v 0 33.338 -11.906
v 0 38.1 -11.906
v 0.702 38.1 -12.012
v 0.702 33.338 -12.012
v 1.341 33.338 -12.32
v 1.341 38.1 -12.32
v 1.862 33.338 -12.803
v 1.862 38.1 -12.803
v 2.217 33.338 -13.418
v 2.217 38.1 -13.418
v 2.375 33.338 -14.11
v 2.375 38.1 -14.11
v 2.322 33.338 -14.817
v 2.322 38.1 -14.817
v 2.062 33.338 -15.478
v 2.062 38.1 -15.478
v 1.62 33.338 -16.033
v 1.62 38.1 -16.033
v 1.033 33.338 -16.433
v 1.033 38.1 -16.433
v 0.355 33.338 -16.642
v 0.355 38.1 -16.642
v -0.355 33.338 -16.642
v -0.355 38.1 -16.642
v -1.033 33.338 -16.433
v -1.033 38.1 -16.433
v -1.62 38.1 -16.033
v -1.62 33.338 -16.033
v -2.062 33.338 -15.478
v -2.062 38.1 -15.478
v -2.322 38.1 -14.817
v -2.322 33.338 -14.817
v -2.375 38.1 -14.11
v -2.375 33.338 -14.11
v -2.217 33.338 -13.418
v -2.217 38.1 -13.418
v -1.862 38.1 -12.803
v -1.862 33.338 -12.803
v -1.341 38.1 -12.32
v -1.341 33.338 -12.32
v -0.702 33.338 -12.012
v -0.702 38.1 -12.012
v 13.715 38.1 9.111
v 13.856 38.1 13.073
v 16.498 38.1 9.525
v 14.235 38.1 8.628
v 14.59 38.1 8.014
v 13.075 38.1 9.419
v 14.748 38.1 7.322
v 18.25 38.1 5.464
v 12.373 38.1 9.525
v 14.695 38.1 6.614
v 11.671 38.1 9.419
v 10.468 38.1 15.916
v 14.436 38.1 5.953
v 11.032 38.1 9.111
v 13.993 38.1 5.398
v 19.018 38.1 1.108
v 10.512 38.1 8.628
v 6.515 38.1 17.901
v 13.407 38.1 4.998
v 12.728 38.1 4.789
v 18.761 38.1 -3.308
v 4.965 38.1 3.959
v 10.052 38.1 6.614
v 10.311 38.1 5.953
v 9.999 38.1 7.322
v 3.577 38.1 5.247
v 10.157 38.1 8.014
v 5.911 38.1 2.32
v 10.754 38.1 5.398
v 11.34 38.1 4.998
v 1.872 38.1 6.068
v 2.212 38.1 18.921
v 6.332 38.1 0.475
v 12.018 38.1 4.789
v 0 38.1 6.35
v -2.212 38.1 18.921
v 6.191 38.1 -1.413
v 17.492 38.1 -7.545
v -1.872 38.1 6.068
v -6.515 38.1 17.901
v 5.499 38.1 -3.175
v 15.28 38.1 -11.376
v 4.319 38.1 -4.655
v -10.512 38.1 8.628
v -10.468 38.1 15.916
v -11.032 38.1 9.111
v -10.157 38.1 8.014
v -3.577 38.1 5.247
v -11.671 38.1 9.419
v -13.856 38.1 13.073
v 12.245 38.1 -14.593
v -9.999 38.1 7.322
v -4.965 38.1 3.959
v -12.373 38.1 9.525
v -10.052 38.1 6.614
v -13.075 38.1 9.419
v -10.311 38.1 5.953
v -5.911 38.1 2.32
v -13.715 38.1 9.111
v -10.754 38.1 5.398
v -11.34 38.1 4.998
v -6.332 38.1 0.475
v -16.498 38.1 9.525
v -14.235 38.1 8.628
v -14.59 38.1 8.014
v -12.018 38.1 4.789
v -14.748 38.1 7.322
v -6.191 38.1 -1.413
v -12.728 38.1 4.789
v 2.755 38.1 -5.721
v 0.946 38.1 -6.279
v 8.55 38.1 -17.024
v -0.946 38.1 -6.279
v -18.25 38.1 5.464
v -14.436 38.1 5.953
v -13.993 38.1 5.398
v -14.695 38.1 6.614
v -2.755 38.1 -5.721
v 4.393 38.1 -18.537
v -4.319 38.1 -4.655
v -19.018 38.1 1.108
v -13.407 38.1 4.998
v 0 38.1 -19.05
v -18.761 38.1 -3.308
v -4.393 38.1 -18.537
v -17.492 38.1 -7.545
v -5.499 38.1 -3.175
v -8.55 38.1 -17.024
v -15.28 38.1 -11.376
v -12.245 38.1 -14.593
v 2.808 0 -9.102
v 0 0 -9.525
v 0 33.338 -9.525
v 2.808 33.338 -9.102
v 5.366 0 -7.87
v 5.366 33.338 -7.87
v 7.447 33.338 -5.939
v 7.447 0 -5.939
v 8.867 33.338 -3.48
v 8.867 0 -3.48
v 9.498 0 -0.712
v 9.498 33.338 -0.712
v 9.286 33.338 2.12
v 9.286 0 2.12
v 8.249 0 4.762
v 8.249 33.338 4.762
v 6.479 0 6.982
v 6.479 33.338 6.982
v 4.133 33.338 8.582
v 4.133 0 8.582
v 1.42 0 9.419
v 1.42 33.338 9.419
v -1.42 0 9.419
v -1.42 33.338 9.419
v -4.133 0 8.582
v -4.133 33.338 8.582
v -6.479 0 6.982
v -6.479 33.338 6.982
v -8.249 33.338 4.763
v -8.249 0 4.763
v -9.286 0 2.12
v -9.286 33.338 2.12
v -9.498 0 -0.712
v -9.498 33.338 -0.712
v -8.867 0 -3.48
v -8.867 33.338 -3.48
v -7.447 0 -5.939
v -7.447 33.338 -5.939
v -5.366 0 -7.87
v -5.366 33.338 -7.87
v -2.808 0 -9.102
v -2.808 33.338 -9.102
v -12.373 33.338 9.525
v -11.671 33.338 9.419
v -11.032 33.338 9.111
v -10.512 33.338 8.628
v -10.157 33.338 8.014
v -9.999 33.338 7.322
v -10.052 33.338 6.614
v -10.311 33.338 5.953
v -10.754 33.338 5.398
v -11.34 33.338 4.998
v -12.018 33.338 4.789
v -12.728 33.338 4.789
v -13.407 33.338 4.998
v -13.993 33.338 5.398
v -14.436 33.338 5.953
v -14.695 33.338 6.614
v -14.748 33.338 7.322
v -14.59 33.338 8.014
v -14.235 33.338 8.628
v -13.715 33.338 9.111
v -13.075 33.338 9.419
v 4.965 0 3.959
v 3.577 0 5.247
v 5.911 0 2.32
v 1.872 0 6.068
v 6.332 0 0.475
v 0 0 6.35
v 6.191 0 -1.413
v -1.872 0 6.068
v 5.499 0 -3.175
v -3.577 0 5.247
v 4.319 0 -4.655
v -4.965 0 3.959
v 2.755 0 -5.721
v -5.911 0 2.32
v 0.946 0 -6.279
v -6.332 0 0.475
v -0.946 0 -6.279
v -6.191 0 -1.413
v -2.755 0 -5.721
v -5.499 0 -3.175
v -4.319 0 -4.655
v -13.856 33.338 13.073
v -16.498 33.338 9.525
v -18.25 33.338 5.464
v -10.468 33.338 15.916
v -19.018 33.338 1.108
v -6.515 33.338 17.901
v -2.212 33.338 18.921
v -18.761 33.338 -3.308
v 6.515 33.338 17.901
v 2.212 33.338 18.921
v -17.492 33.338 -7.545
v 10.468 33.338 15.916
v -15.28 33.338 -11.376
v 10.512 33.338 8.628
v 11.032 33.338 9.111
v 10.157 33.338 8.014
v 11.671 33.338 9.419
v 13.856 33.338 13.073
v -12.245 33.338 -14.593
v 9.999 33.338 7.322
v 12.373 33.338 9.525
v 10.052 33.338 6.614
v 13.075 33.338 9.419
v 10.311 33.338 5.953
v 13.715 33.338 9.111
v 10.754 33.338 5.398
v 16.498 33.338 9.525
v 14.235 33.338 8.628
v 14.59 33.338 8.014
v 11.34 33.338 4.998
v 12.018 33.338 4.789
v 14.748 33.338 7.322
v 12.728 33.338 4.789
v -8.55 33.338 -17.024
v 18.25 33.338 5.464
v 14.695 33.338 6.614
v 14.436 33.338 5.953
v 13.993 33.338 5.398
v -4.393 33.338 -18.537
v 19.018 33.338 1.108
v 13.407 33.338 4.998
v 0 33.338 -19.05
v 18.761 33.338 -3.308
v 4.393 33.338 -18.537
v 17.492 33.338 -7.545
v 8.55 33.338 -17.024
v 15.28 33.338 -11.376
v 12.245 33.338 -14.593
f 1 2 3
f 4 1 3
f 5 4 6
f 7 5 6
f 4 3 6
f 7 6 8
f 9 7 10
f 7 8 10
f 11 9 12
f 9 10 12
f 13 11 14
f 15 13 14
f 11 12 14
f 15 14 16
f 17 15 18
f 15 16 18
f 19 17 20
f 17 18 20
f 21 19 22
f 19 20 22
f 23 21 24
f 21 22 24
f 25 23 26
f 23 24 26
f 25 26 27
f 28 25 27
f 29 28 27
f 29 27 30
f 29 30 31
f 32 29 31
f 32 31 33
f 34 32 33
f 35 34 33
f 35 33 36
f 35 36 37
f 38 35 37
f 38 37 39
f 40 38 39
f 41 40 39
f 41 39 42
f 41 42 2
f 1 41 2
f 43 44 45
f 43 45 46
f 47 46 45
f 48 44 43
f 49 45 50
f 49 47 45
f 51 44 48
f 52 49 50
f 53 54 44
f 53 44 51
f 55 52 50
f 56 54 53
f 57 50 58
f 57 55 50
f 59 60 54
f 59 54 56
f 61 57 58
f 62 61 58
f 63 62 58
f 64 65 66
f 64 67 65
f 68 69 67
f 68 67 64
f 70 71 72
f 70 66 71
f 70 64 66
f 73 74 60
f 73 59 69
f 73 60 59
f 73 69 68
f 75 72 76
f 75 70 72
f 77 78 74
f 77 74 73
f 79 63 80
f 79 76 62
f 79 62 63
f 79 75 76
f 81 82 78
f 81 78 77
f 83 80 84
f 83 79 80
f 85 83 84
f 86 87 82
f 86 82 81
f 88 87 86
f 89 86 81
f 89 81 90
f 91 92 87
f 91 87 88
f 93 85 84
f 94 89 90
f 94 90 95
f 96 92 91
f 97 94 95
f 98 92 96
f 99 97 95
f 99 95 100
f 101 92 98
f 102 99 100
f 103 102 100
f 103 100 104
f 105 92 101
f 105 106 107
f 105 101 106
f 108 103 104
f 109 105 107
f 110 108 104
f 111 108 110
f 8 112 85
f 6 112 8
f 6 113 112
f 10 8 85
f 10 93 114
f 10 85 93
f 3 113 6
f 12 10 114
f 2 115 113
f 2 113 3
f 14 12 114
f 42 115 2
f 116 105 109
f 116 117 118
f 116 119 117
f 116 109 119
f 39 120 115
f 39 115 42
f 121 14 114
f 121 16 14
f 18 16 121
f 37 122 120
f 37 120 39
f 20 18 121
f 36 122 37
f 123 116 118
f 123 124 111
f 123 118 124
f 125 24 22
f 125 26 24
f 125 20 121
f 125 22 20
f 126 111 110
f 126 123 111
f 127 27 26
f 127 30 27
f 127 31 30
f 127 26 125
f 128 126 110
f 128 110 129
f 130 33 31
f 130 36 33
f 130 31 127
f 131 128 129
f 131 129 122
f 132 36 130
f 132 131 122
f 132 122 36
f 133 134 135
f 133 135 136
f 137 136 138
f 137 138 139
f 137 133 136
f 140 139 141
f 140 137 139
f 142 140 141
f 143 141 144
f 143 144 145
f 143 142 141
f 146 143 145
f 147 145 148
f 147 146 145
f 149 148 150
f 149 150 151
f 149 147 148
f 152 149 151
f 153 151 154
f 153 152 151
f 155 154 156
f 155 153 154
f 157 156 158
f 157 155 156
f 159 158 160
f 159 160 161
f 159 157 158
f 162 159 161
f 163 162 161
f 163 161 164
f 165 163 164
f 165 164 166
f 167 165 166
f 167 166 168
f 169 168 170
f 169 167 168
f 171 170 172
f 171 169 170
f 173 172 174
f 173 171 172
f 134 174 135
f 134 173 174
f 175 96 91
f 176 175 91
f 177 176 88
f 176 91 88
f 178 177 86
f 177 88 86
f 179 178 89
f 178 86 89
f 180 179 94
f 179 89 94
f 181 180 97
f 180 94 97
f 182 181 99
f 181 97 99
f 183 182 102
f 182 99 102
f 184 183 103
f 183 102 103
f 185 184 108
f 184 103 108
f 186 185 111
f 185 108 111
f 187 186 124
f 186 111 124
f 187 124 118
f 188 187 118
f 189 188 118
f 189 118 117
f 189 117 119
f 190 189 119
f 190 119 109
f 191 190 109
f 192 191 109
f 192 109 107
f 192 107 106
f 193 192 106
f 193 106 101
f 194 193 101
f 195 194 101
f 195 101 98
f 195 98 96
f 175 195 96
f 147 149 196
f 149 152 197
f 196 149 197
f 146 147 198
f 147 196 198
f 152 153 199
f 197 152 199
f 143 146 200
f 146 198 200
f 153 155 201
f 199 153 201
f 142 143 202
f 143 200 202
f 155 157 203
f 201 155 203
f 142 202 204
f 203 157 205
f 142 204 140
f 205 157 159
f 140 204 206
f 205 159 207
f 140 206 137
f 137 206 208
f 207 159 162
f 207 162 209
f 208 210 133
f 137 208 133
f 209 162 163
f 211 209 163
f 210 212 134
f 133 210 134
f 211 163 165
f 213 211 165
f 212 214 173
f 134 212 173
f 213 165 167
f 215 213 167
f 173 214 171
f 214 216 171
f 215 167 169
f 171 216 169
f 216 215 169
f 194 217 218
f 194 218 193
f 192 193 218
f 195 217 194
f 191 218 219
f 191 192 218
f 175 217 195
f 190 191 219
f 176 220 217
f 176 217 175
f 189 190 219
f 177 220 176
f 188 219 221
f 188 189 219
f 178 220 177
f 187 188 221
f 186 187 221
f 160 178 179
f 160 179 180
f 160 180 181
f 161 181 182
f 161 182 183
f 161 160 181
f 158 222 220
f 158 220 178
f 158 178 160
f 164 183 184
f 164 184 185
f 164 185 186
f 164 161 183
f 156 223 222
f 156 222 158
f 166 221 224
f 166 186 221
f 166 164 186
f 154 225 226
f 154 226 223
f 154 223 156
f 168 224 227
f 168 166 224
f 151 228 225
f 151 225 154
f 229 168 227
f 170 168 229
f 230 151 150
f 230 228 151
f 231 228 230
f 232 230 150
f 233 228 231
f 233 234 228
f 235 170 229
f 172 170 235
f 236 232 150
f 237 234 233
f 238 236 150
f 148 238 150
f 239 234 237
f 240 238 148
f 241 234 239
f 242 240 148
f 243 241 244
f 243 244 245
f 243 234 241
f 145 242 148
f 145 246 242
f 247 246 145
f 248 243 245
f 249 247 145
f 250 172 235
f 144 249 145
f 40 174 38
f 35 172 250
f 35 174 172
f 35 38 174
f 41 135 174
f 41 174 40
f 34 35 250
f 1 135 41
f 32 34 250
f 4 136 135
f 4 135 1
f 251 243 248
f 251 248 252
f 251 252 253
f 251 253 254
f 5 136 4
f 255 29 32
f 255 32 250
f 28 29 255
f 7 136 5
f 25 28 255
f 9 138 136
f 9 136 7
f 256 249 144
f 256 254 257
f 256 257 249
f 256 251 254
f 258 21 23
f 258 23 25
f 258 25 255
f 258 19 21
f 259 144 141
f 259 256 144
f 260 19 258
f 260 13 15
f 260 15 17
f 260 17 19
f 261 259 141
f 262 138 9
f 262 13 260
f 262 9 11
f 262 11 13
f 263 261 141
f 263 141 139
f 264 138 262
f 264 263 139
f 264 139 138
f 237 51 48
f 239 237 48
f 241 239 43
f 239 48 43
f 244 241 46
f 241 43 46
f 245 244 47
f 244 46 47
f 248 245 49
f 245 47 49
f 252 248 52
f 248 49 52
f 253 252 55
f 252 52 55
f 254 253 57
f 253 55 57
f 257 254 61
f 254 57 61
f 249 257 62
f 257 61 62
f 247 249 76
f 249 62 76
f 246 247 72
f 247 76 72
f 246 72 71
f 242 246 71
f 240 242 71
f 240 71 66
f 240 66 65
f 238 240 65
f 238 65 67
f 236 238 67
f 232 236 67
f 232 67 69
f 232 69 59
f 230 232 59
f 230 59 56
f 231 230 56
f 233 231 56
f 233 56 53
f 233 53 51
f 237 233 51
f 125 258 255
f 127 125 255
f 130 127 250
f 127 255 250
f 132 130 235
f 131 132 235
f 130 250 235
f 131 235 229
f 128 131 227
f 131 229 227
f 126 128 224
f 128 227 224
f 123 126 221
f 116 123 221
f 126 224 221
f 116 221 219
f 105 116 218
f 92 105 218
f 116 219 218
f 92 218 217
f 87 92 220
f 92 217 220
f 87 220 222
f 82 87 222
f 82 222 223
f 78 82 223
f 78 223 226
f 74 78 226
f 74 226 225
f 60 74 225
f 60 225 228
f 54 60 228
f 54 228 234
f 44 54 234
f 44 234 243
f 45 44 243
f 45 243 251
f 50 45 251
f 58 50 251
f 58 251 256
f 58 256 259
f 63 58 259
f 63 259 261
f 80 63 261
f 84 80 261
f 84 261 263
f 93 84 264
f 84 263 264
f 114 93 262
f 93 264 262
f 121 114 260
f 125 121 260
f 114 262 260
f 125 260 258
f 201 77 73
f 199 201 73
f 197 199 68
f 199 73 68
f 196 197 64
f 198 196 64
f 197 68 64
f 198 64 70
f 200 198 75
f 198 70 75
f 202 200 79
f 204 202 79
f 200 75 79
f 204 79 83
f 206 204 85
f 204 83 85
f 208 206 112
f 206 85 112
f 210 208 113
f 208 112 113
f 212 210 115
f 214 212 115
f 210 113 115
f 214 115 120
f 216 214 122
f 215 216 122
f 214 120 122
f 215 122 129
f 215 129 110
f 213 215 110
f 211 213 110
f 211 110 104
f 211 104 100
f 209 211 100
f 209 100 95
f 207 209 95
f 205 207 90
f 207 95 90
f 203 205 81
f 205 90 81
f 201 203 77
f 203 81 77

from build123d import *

# Parameters (mm, degrees)
SKETCH1_R           = 19.05
BOSS_EXTRUDE1_DEPTH = 38.1
SKETCH2_R           = 19.05
SKETCH2_R_2         = 9.525
CUT_EXTRUDE1_DEPTH  = 33.3375
SKETCH3_R           = 6.35
SKETCH3_R_2         = 2.38125
CUT_EXTRUDE2_DEPTH  = 38.1


with BuildPart() as part:
    # Sketch1 → Boss-Extrude1 (new body)
    with BuildSketch(Plane(origin=(0, 0, 0), x_dir=(1, 0, 0), z_dir=(0, 1, 0))):
        with Locations(Location((0, 0, 0), (0, 0, 90))):
            Circle(SKETCH1_R)
    extrude(amount=BOSS_EXTRUDE1_DEPTH)

    # Sketch2 → Cut-Extrude1 (cut)
    with BuildSketch(Plane.XZ):
        with Locations(Location((0, 0, 0), (0, 0, 270))):
            Circle(SKETCH2_R)
        with Locations(Location((0, 0, 0), (0, 0, 270))):
            Circle(SKETCH2_R_2, mode=Mode.SUBTRACT)
    extrude(amount=-CUT_EXTRUDE1_DEPTH, mode=Mode.SUBTRACT)

    # Sketch3 → Cut-Extrude2 (cut)
    with BuildSketch(Plane(origin=(0, 38.1, 0), x_dir=(1, 0, 0), z_dir=(0, 1, 0))):
        with Locations(Location((0, 0, 0), (0, 0, 270))):
            Circle(SKETCH3_R)
        with Locations(Location((0, 14.2875, 0), (0, 0, 270))):
            Circle(SKETCH3_R_2)
        with Locations(Location((12.373337957, -7.14375, 0), (0, 0, 270))):
            Circle(SKETCH3_R_2)
        with Locations(Location((-12.373337957, -7.14375, 0), (0, 0, 270))):
            Circle(SKETCH3_R_2)
    extrude(amount=-CUT_EXTRUDE2_DEPTH, mode=Mode.SUBTRACT)


solid = part.part
